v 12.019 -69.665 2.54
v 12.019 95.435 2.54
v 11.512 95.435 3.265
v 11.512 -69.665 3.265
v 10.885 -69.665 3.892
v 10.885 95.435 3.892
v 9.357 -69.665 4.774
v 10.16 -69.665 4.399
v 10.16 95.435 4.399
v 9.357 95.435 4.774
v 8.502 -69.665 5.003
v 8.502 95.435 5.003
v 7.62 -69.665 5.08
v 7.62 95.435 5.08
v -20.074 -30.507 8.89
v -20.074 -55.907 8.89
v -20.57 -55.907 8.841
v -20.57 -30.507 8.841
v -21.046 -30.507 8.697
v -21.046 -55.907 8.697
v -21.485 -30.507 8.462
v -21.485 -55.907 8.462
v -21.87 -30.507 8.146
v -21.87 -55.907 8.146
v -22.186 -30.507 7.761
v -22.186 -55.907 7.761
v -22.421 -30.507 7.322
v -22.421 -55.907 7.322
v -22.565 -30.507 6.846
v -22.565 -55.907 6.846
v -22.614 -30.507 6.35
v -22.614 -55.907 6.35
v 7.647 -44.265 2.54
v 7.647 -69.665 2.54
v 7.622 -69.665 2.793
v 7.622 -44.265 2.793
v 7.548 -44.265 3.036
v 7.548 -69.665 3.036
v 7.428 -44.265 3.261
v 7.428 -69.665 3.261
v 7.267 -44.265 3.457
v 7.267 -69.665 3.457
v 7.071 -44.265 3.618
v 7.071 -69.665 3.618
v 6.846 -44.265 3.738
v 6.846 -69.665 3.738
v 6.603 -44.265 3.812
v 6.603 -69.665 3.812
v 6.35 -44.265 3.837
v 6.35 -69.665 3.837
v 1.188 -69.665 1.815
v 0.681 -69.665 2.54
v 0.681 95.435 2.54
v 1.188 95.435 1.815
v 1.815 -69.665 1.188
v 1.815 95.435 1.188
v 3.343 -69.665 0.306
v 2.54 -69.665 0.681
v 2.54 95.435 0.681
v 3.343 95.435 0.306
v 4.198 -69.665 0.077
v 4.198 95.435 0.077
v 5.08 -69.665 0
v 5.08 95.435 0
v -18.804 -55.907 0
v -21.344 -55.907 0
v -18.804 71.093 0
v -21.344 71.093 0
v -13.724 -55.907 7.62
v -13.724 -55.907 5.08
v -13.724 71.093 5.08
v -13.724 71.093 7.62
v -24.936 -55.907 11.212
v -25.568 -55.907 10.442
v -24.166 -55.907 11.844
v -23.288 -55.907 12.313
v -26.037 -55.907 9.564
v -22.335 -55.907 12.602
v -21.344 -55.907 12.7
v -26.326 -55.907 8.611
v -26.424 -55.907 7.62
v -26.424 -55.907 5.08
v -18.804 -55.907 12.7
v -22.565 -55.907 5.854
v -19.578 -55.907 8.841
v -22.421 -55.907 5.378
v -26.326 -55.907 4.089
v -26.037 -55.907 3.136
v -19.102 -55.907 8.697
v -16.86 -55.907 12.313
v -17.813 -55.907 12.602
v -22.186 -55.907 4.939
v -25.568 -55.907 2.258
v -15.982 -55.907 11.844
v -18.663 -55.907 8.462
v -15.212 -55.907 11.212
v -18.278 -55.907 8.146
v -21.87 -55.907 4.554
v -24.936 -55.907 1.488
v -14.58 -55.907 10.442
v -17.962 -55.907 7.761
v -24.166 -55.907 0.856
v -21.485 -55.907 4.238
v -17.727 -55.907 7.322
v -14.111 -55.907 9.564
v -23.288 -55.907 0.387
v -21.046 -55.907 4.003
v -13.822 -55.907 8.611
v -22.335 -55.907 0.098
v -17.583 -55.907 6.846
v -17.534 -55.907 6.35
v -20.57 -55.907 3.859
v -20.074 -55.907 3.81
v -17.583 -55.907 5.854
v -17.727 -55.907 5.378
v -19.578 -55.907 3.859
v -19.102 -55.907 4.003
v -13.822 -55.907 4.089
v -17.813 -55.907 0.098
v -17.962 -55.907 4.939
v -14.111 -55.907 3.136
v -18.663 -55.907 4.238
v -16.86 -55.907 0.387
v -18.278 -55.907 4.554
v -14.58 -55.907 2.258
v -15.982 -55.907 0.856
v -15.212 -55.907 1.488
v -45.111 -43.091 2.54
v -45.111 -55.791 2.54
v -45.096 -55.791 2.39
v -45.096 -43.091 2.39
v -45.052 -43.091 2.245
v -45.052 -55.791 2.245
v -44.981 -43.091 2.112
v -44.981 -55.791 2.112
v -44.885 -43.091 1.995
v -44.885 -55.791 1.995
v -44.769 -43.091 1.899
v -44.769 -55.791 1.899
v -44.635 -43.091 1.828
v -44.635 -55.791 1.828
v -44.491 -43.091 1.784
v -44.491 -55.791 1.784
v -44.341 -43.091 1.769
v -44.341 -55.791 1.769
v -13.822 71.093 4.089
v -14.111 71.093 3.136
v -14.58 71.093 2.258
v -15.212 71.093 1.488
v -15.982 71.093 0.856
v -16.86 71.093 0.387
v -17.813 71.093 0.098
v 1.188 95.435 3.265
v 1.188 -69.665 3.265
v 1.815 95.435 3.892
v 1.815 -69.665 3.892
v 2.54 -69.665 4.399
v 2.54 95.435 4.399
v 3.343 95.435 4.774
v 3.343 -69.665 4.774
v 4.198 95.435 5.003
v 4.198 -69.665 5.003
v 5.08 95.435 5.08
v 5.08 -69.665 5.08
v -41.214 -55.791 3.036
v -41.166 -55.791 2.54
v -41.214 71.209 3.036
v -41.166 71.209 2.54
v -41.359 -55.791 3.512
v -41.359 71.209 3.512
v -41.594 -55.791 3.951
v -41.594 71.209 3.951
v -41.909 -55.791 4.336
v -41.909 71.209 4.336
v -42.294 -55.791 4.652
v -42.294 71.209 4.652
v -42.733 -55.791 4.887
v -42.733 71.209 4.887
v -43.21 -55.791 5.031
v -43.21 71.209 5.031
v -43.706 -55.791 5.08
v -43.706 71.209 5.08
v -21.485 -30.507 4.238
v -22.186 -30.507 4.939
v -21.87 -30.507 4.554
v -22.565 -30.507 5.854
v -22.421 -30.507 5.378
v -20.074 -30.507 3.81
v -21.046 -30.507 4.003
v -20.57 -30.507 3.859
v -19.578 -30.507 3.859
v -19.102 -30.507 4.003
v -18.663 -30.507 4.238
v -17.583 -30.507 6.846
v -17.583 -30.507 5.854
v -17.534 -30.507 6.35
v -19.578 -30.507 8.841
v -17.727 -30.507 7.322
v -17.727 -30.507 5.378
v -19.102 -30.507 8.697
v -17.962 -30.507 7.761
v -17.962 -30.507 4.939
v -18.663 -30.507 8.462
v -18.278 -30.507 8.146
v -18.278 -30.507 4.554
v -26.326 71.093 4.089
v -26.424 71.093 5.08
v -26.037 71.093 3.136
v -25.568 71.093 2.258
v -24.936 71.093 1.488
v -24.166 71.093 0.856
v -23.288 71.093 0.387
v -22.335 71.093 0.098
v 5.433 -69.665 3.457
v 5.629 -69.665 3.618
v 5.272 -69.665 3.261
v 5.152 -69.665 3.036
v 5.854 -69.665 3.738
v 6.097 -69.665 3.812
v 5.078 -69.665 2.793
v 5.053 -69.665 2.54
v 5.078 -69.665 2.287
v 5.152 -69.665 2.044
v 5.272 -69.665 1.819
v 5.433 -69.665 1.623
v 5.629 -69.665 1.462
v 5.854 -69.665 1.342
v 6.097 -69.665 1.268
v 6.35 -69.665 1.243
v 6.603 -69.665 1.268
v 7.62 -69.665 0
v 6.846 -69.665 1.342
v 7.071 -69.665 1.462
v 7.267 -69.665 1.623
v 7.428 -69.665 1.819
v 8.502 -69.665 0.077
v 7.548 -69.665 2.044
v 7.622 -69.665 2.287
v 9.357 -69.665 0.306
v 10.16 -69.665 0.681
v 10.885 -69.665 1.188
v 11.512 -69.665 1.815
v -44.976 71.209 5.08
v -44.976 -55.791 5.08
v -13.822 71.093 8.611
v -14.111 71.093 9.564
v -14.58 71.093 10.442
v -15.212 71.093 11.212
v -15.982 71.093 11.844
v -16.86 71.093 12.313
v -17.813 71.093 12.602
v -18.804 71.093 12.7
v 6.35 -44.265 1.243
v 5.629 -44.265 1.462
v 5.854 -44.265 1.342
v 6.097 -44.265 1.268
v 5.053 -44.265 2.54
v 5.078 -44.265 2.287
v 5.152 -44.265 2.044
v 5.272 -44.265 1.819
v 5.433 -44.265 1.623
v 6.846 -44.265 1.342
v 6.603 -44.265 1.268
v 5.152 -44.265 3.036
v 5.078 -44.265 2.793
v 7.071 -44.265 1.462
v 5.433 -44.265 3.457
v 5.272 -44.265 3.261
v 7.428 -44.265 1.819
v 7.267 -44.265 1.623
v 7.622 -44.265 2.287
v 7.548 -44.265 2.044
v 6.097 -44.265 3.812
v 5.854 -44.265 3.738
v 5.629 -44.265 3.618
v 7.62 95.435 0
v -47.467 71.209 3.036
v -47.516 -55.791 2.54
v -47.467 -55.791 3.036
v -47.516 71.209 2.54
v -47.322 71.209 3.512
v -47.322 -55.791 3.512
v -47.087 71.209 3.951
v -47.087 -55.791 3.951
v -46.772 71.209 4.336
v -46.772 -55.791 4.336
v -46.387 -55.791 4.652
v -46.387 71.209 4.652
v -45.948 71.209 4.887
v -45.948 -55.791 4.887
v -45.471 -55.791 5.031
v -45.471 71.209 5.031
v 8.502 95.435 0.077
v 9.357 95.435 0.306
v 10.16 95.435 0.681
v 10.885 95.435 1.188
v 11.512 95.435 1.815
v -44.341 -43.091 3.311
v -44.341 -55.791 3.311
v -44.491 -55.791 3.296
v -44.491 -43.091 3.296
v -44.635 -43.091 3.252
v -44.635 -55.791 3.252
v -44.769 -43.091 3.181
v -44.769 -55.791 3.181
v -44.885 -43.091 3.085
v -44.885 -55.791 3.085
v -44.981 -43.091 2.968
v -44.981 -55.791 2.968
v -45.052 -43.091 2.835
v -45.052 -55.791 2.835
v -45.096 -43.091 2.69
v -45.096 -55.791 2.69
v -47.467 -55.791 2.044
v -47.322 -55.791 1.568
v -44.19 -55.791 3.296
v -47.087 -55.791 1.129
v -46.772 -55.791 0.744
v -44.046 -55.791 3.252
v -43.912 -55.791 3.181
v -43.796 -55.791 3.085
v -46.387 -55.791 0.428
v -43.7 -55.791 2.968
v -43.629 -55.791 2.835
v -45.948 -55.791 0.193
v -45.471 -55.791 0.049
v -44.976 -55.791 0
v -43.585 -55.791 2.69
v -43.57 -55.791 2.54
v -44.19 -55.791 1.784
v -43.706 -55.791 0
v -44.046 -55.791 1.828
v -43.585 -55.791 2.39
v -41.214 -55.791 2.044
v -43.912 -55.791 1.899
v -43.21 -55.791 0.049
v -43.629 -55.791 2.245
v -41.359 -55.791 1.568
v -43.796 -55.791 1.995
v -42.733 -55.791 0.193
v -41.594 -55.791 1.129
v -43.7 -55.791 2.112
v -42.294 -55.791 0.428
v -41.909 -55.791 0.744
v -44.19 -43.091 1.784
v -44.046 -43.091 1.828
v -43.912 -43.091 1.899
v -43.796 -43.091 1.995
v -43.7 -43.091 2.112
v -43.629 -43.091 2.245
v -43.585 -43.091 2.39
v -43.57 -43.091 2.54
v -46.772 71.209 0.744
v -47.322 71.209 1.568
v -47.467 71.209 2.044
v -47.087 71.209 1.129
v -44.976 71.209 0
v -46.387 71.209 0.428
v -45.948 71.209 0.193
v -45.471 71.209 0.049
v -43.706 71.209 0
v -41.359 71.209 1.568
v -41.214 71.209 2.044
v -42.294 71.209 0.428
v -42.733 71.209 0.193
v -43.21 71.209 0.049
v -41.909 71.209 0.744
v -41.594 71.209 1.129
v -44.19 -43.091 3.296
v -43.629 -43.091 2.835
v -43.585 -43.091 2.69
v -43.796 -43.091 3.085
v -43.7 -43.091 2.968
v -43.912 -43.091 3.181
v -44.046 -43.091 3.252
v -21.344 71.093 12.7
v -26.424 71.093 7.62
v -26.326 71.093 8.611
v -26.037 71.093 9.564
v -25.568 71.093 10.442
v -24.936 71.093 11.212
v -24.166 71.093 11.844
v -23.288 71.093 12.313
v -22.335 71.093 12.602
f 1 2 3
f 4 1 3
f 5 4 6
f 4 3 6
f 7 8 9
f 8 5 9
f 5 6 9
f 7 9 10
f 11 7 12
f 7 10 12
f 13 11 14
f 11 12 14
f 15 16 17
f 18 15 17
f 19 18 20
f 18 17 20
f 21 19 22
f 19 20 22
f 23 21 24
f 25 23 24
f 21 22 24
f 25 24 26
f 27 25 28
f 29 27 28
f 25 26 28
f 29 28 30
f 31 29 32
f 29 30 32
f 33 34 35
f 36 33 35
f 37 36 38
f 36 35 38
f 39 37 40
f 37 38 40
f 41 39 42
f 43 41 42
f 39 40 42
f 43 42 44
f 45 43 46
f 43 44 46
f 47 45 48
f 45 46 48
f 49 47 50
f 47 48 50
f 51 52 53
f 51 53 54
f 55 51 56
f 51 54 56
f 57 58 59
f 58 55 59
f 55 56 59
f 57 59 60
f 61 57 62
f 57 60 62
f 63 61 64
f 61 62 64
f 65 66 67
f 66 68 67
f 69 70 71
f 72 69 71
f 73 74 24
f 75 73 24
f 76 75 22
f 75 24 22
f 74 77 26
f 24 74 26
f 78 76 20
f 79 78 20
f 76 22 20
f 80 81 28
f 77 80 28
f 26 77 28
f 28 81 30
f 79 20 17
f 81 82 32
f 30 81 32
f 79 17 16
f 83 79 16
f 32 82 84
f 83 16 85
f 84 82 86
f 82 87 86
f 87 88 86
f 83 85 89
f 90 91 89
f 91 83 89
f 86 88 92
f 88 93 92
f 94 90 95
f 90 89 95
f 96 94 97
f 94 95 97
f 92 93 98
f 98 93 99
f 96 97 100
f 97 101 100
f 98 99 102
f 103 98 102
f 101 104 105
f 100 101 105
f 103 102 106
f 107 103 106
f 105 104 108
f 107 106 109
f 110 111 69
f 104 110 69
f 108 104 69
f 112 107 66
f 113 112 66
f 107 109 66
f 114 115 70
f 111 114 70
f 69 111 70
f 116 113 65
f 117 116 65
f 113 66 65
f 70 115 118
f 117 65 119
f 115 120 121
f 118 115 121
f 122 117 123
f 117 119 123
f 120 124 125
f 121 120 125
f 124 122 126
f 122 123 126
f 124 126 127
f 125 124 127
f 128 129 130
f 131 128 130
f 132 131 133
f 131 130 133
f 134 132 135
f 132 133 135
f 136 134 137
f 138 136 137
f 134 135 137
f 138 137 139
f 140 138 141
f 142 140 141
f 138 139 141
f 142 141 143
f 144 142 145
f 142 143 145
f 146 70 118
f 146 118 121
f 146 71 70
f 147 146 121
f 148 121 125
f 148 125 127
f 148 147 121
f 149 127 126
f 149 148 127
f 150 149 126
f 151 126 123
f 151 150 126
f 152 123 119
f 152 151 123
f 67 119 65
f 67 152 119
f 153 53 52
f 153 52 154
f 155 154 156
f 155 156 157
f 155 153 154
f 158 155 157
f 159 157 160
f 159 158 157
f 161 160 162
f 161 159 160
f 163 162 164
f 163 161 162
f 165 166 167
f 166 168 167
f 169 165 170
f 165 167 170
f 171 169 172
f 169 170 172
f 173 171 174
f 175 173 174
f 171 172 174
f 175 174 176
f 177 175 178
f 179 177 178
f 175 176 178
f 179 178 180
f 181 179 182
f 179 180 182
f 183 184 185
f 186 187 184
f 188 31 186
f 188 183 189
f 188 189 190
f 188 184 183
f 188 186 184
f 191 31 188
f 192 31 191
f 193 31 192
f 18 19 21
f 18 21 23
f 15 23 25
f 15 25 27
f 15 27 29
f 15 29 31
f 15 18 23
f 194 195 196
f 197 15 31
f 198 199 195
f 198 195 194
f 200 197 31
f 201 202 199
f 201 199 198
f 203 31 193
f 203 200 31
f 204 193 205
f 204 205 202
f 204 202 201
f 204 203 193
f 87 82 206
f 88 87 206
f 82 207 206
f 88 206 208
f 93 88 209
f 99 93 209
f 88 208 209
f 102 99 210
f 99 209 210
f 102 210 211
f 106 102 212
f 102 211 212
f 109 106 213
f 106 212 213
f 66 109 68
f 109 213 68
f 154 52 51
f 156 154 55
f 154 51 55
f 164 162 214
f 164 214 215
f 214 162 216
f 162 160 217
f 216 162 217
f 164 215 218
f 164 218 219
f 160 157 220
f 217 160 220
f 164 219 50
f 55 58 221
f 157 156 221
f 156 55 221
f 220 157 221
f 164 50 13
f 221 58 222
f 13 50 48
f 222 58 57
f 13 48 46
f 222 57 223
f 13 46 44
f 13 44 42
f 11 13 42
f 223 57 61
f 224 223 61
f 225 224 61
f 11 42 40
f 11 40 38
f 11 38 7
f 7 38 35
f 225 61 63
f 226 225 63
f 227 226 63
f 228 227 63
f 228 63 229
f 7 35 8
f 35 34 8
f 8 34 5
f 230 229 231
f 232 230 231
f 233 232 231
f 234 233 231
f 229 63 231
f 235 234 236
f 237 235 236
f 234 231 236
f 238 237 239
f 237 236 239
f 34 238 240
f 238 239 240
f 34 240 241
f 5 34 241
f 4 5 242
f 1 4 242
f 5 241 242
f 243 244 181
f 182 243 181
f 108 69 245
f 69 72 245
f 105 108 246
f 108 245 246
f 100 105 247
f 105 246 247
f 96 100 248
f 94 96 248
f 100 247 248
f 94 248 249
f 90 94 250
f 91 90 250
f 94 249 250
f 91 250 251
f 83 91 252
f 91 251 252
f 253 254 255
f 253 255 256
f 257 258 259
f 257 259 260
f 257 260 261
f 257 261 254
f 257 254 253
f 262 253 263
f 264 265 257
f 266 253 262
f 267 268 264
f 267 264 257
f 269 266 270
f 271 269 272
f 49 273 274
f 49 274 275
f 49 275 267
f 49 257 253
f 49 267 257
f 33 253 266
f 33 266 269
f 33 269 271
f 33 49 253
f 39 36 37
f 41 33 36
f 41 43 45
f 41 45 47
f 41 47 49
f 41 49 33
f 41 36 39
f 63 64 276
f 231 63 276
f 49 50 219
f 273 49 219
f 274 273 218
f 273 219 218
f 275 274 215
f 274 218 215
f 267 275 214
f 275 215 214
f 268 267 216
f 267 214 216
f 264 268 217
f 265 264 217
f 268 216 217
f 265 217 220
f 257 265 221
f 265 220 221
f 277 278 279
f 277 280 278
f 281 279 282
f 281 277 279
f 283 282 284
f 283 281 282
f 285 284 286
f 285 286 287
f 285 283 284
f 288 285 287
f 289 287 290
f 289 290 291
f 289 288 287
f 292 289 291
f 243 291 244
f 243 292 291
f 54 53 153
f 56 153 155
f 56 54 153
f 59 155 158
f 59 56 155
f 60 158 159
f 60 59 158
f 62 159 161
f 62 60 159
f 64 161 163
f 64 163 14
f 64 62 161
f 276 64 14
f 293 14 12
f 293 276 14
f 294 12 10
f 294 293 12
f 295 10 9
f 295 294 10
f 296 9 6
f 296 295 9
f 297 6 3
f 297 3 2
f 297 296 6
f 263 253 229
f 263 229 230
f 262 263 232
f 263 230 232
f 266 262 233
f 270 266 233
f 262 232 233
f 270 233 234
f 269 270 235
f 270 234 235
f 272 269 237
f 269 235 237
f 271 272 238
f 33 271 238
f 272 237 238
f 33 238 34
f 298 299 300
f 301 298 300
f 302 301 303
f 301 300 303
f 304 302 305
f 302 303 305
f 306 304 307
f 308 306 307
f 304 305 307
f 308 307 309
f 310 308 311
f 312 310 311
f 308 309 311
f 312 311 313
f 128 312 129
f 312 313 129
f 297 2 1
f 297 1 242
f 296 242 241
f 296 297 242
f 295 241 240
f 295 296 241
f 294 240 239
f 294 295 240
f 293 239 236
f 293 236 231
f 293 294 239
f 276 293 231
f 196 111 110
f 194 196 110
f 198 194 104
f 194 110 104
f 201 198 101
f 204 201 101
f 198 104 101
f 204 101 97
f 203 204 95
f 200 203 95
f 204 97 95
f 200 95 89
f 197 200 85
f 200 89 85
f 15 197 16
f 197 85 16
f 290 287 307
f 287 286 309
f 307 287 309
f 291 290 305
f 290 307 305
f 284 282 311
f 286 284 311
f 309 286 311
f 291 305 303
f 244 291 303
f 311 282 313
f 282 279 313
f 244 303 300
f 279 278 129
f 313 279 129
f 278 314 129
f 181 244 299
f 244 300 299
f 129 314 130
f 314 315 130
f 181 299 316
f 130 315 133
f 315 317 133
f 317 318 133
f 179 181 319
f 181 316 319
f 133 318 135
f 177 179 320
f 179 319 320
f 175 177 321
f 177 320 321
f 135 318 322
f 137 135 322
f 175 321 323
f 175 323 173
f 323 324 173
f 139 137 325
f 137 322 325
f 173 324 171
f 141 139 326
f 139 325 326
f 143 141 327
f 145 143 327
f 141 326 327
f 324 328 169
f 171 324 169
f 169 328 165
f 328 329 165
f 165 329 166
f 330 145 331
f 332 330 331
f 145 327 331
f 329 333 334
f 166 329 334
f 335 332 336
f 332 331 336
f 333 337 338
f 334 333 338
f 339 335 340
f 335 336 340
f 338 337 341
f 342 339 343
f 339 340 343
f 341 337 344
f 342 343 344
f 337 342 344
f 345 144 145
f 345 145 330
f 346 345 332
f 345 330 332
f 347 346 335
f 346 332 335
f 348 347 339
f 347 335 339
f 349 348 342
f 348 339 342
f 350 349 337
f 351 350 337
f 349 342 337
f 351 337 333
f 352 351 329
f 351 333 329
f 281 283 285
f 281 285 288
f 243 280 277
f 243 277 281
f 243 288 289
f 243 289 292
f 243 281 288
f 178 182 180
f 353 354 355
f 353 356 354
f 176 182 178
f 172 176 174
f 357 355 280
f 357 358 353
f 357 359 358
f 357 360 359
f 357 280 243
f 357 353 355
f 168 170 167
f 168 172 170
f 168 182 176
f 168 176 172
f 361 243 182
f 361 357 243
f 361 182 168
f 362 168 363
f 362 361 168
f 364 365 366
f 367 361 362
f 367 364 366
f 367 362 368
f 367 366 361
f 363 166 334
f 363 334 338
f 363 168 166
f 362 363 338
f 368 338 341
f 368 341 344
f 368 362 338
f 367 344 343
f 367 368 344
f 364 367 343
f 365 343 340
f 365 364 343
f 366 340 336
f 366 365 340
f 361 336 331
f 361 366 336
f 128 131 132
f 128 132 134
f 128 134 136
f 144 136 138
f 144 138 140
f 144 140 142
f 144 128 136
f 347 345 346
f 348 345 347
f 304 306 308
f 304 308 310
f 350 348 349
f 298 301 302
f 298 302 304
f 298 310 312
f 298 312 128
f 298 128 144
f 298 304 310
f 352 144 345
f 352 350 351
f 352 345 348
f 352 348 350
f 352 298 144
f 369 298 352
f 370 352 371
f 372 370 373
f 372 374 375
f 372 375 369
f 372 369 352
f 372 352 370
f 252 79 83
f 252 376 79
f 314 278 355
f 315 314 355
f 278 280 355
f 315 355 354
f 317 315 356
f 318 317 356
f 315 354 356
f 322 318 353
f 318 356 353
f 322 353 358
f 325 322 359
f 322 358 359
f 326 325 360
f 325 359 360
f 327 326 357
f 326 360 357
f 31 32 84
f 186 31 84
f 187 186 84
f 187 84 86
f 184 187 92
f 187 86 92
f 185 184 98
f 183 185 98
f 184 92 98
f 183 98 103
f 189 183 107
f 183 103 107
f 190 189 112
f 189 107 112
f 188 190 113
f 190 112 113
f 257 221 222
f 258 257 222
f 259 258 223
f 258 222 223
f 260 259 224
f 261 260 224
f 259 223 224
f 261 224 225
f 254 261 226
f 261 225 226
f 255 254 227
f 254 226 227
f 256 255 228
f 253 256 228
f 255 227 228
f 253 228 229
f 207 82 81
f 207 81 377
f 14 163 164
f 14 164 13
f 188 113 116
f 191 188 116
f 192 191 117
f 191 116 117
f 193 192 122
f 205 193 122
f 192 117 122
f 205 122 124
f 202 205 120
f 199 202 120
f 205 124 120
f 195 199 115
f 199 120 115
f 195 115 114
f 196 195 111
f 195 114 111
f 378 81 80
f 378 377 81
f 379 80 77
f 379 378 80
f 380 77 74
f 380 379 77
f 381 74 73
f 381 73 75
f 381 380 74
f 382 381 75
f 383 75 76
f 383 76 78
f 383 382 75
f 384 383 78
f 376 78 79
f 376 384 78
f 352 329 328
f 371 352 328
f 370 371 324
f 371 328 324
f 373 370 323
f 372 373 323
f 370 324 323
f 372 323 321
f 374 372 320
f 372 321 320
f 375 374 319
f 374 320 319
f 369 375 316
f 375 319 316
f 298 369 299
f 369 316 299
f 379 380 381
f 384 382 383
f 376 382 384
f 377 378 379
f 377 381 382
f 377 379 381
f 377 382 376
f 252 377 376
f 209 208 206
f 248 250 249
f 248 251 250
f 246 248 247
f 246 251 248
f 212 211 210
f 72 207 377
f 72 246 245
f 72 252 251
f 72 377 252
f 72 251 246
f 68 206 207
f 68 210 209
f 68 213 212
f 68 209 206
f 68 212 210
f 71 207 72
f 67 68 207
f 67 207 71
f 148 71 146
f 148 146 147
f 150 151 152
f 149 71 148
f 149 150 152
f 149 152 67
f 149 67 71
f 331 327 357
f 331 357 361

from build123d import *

# Parameters (mm, degrees)
F0_W         = 6.35
F0_H         = 127
F1_DEPTH     = 5.08
F2_R         = 2.53999
F4_DEPTH     = 12.7
F5_W         = 12.7
F5_H         = 127
F6_DEPTH     = 12.7
F7_R         = 5.08
F9_DEPTH     = 25.4
F10_W        = 12.7
F10_H        = 165.1
F11_DEPTH    = 5.08
F12_T1_DEPTH = 190.5
F14_DEPTH    = 25.4


# Not quite as in the source:
# - a fillet or chamfer that OpenCascade refuses, or shapes differently, is made with other operations: its cross-section is extruded or revolved along the edge and cut away or added
# - a fillet or chamfer is up to 0.001 mm smaller than in the source, because OpenCascade refuses the exact size


with BuildPart() as f1:
    # F0 (on Top) → F1 (new body)
    with BuildSketch(Plane.XY):
        with Locations((-44.3405173719, 7.7090010995)):
            Rectangle(F0_W, F0_H)
    extrude(amount=F1_DEPTH)

    # F2 (radius 2.54 in the source; OpenCascade refuses exactly that, so slightly less here)
    f2_edges = [f1.edges().sort_by_distance(p)[0] for p in [
        (-47.515517, 7.709001, 5.08),
        (-41.165517, 7.709001, 5.08),
        (-41.165517, 7.709001, 0),
        (-47.515517, 7.709001, 0),
    ]]
    fillet(f2_edges, radius=F2_R)

    # F3 (on face) → F4 (cut)
    with BuildSketch(Plane.XZ.offset(55.7909989005)):
        with BuildLine():
            Line((-45.1111345742, 2.54), (-44.3405173719, 2.54))
            Line((-44.3405173719, 2.54), (-44.3405173719, 3.3106172023))
            ThreePointArc((-44.3405173719, 3.3106172023), (-44.8854260214, 3.0849086495), (-45.1111345742, 2.54))
        make_face()
        with BuildLine():
            Line((-44.3405173719, 2.54), (-43.5699001695, 2.54))
            ThreePointArc((-43.5699001695, 2.54), (-43.7956087224, 3.0849086495), (-44.3405173719, 3.3106172023))
            Line((-44.3405173719, 3.3106172023), (-44.3405173719, 2.54))
        make_face()
        with BuildLine():
            ThreePointArc((-44.3405173719, 1.7693827977), (-43.7956087224, 1.9950913505), (-43.5699001695, 2.54))
            Line((-43.5699001695, 2.54), (-44.3405173719, 2.54))
            Line((-44.3405173719, 2.54), (-44.3405173719, 1.7693827977))
        make_face()
        with BuildLine():
            Line((-44.3405173719, 1.7693827977), (-44.3405173719, 2.54))
            Line((-44.3405173719, 2.54), (-45.1111345742, 2.54))
            ThreePointArc((-45.1111345742, 2.54), (-44.8854260214, 1.9950913505), (-44.3405173719, 1.7693827977))
        make_face()
    extrude(amount=-F4_DEPTH, mode=Mode.SUBTRACT)


with BuildPart() as f6:
    # F5 (on Top) → F6 (new body)
    with BuildSketch(Plane.XY):
        with Locations((-20.0740229338, 7.5928430158)):
            Rectangle(F5_W, F5_H)
    extrude(amount=F6_DEPTH)

    # F7
    f7_edges = [f6.edges().sort_by_distance(p)[0] for p in [
        (-26.424023, 7.592843, 12.7),
        (-13.724023, 7.592843, 12.7),
        (-13.724023, 7.592843, 0),
        (-26.424023, 7.592843, 0),
    ]]
    fillet(f7_edges, radius=F7_R)

    # F8 (on face) → F9 (cut)
    with BuildSketch(Plane.XZ.offset(55.9071569842)):
        with BuildLine():
            ThreePointArc((-17.5340229338, 6.35), (-18.2779717096, 8.1460512242), (-20.0740229338, 8.89))
            Line((-20.0740229338, 8.89), (-20.0740229338, 6.35))
            Line((-20.0740229338, 6.35), (-17.5340229338, 6.35))
        make_face()
        with BuildLine():
            Line((-20.0740229338, 6.35), (-20.0740229338, 8.89))
            ThreePointArc((-20.0740229338, 8.89), (-21.8700741581, 8.1460512242), (-22.6140229338, 6.35))
            Line((-22.6140229338, 6.35), (-20.0740229338, 6.35))
        make_face()
        with BuildLine():
            Line((-20.0740229338, 3.81), (-20.0740229338, 6.35))
            Line((-20.0740229338, 6.35), (-22.6140229338, 6.35))
            ThreePointArc((-22.6140229338, 6.35), (-21.8700741581, 4.5539487758), (-20.0740229338, 3.81))
        make_face()
        with BuildLine():
            Line((-17.5340229338, 6.35), (-20.0740229338, 6.35))
            Line((-20.0740229338, 6.35), (-20.0740229338, 3.81))
            ThreePointArc((-20.0740229338, 3.81), (-18.2779717096, 4.5539487758), (-17.5340229338, 6.35))
        make_face()
    extrude(amount=-F9_DEPTH, mode=Mode.SUBTRACT)


with BuildPart() as f11:
    # F10 (on Top) → F11 (new body)
    with BuildSketch(Plane.XY):
        with Locations((6.35, 12.8850169986)):
            Rectangle(F10_W, F10_H)
    extrude(amount=F11_DEPTH)

    # F12: fillet of radius 5.08 on 4 edges, made by hand

    # F12_s2 → F12_t1 (cut)
    with BuildSketch(Plane.XZ.offset(-108.1350169986)):
        with BuildLine():
            ThreePointArc((12.7, 0), (11.2121024484, 3.5921024484), (7.62, 5.08))
            Line((7.62, 5.08), (12.7, 5.08))
            Line((12.7, 5.08), (12.7, 0))
        make_face()
        with BuildLine():
            ThreePointArc((0, 0), (1.4878975516, 3.5921024484), (5.08, 5.08))
            Line((5.08, 5.08), (0, 5.08))
            Line((0, 5.08), (0, 0))
        make_face()
        with BuildLine():
            ThreePointArc((12.7, 5.08), (11.2121024484, 1.4878975516), (7.62, 0))
            Line((7.62, 0), (12.7, 0))
            Line((12.7, 0), (12.7, 5.08))
        make_face()
        with BuildLine():
            ThreePointArc((0, 5.08), (1.4878975516, 1.4878975516), (5.08, 0))
            Line((5.08, 0), (0, 0))
            Line((0, 0), (0, 5.08))
        make_face()
    extrude(amount=F12_T1_DEPTH, mode=Mode.SUBTRACT)

    # F13 (on face) → F14 (cut)
    with BuildSketch(Plane.XZ.offset(69.6649830014)):
        with BuildLine():
            ThreePointArc((7.6470044609, 2.54), (7.2671206496, 3.4571206496), (6.35, 3.8370044609))
            Line((6.35, 3.8370044609), (6.35, 2.54))
            Line((6.35, 2.54), (7.6470044609, 2.54))
        make_face()
        with BuildLine():
            Line((6.35, 2.54), (6.35, 3.8370044609))
            ThreePointArc((6.35, 3.8370044609), (5.4328793504, 3.4571206496), (5.0529955391, 2.54))
            Line((5.0529955391, 2.54), (6.35, 2.54))
        make_face()
        with BuildLine():
            Line((6.35, 1.2429955391), (6.35, 2.54))
            Line((6.35, 2.54), (5.0529955391, 2.54))
            ThreePointArc((5.0529955391, 2.54), (5.4328793504, 1.6228793504), (6.35, 1.2429955391))
        make_face()
        with BuildLine():
            Line((7.6470044609, 2.54), (6.35, 2.54))
            Line((6.35, 2.54), (6.35, 1.2429955391))
            ThreePointArc((6.35, 1.2429955391), (7.2671206496, 1.6228793504), (7.6470044609, 2.54))
        make_face()
    extrude(amount=-F14_DEPTH, mode=Mode.SUBTRACT)


solid = Compound([f1.part, f6.part, f11.part])
